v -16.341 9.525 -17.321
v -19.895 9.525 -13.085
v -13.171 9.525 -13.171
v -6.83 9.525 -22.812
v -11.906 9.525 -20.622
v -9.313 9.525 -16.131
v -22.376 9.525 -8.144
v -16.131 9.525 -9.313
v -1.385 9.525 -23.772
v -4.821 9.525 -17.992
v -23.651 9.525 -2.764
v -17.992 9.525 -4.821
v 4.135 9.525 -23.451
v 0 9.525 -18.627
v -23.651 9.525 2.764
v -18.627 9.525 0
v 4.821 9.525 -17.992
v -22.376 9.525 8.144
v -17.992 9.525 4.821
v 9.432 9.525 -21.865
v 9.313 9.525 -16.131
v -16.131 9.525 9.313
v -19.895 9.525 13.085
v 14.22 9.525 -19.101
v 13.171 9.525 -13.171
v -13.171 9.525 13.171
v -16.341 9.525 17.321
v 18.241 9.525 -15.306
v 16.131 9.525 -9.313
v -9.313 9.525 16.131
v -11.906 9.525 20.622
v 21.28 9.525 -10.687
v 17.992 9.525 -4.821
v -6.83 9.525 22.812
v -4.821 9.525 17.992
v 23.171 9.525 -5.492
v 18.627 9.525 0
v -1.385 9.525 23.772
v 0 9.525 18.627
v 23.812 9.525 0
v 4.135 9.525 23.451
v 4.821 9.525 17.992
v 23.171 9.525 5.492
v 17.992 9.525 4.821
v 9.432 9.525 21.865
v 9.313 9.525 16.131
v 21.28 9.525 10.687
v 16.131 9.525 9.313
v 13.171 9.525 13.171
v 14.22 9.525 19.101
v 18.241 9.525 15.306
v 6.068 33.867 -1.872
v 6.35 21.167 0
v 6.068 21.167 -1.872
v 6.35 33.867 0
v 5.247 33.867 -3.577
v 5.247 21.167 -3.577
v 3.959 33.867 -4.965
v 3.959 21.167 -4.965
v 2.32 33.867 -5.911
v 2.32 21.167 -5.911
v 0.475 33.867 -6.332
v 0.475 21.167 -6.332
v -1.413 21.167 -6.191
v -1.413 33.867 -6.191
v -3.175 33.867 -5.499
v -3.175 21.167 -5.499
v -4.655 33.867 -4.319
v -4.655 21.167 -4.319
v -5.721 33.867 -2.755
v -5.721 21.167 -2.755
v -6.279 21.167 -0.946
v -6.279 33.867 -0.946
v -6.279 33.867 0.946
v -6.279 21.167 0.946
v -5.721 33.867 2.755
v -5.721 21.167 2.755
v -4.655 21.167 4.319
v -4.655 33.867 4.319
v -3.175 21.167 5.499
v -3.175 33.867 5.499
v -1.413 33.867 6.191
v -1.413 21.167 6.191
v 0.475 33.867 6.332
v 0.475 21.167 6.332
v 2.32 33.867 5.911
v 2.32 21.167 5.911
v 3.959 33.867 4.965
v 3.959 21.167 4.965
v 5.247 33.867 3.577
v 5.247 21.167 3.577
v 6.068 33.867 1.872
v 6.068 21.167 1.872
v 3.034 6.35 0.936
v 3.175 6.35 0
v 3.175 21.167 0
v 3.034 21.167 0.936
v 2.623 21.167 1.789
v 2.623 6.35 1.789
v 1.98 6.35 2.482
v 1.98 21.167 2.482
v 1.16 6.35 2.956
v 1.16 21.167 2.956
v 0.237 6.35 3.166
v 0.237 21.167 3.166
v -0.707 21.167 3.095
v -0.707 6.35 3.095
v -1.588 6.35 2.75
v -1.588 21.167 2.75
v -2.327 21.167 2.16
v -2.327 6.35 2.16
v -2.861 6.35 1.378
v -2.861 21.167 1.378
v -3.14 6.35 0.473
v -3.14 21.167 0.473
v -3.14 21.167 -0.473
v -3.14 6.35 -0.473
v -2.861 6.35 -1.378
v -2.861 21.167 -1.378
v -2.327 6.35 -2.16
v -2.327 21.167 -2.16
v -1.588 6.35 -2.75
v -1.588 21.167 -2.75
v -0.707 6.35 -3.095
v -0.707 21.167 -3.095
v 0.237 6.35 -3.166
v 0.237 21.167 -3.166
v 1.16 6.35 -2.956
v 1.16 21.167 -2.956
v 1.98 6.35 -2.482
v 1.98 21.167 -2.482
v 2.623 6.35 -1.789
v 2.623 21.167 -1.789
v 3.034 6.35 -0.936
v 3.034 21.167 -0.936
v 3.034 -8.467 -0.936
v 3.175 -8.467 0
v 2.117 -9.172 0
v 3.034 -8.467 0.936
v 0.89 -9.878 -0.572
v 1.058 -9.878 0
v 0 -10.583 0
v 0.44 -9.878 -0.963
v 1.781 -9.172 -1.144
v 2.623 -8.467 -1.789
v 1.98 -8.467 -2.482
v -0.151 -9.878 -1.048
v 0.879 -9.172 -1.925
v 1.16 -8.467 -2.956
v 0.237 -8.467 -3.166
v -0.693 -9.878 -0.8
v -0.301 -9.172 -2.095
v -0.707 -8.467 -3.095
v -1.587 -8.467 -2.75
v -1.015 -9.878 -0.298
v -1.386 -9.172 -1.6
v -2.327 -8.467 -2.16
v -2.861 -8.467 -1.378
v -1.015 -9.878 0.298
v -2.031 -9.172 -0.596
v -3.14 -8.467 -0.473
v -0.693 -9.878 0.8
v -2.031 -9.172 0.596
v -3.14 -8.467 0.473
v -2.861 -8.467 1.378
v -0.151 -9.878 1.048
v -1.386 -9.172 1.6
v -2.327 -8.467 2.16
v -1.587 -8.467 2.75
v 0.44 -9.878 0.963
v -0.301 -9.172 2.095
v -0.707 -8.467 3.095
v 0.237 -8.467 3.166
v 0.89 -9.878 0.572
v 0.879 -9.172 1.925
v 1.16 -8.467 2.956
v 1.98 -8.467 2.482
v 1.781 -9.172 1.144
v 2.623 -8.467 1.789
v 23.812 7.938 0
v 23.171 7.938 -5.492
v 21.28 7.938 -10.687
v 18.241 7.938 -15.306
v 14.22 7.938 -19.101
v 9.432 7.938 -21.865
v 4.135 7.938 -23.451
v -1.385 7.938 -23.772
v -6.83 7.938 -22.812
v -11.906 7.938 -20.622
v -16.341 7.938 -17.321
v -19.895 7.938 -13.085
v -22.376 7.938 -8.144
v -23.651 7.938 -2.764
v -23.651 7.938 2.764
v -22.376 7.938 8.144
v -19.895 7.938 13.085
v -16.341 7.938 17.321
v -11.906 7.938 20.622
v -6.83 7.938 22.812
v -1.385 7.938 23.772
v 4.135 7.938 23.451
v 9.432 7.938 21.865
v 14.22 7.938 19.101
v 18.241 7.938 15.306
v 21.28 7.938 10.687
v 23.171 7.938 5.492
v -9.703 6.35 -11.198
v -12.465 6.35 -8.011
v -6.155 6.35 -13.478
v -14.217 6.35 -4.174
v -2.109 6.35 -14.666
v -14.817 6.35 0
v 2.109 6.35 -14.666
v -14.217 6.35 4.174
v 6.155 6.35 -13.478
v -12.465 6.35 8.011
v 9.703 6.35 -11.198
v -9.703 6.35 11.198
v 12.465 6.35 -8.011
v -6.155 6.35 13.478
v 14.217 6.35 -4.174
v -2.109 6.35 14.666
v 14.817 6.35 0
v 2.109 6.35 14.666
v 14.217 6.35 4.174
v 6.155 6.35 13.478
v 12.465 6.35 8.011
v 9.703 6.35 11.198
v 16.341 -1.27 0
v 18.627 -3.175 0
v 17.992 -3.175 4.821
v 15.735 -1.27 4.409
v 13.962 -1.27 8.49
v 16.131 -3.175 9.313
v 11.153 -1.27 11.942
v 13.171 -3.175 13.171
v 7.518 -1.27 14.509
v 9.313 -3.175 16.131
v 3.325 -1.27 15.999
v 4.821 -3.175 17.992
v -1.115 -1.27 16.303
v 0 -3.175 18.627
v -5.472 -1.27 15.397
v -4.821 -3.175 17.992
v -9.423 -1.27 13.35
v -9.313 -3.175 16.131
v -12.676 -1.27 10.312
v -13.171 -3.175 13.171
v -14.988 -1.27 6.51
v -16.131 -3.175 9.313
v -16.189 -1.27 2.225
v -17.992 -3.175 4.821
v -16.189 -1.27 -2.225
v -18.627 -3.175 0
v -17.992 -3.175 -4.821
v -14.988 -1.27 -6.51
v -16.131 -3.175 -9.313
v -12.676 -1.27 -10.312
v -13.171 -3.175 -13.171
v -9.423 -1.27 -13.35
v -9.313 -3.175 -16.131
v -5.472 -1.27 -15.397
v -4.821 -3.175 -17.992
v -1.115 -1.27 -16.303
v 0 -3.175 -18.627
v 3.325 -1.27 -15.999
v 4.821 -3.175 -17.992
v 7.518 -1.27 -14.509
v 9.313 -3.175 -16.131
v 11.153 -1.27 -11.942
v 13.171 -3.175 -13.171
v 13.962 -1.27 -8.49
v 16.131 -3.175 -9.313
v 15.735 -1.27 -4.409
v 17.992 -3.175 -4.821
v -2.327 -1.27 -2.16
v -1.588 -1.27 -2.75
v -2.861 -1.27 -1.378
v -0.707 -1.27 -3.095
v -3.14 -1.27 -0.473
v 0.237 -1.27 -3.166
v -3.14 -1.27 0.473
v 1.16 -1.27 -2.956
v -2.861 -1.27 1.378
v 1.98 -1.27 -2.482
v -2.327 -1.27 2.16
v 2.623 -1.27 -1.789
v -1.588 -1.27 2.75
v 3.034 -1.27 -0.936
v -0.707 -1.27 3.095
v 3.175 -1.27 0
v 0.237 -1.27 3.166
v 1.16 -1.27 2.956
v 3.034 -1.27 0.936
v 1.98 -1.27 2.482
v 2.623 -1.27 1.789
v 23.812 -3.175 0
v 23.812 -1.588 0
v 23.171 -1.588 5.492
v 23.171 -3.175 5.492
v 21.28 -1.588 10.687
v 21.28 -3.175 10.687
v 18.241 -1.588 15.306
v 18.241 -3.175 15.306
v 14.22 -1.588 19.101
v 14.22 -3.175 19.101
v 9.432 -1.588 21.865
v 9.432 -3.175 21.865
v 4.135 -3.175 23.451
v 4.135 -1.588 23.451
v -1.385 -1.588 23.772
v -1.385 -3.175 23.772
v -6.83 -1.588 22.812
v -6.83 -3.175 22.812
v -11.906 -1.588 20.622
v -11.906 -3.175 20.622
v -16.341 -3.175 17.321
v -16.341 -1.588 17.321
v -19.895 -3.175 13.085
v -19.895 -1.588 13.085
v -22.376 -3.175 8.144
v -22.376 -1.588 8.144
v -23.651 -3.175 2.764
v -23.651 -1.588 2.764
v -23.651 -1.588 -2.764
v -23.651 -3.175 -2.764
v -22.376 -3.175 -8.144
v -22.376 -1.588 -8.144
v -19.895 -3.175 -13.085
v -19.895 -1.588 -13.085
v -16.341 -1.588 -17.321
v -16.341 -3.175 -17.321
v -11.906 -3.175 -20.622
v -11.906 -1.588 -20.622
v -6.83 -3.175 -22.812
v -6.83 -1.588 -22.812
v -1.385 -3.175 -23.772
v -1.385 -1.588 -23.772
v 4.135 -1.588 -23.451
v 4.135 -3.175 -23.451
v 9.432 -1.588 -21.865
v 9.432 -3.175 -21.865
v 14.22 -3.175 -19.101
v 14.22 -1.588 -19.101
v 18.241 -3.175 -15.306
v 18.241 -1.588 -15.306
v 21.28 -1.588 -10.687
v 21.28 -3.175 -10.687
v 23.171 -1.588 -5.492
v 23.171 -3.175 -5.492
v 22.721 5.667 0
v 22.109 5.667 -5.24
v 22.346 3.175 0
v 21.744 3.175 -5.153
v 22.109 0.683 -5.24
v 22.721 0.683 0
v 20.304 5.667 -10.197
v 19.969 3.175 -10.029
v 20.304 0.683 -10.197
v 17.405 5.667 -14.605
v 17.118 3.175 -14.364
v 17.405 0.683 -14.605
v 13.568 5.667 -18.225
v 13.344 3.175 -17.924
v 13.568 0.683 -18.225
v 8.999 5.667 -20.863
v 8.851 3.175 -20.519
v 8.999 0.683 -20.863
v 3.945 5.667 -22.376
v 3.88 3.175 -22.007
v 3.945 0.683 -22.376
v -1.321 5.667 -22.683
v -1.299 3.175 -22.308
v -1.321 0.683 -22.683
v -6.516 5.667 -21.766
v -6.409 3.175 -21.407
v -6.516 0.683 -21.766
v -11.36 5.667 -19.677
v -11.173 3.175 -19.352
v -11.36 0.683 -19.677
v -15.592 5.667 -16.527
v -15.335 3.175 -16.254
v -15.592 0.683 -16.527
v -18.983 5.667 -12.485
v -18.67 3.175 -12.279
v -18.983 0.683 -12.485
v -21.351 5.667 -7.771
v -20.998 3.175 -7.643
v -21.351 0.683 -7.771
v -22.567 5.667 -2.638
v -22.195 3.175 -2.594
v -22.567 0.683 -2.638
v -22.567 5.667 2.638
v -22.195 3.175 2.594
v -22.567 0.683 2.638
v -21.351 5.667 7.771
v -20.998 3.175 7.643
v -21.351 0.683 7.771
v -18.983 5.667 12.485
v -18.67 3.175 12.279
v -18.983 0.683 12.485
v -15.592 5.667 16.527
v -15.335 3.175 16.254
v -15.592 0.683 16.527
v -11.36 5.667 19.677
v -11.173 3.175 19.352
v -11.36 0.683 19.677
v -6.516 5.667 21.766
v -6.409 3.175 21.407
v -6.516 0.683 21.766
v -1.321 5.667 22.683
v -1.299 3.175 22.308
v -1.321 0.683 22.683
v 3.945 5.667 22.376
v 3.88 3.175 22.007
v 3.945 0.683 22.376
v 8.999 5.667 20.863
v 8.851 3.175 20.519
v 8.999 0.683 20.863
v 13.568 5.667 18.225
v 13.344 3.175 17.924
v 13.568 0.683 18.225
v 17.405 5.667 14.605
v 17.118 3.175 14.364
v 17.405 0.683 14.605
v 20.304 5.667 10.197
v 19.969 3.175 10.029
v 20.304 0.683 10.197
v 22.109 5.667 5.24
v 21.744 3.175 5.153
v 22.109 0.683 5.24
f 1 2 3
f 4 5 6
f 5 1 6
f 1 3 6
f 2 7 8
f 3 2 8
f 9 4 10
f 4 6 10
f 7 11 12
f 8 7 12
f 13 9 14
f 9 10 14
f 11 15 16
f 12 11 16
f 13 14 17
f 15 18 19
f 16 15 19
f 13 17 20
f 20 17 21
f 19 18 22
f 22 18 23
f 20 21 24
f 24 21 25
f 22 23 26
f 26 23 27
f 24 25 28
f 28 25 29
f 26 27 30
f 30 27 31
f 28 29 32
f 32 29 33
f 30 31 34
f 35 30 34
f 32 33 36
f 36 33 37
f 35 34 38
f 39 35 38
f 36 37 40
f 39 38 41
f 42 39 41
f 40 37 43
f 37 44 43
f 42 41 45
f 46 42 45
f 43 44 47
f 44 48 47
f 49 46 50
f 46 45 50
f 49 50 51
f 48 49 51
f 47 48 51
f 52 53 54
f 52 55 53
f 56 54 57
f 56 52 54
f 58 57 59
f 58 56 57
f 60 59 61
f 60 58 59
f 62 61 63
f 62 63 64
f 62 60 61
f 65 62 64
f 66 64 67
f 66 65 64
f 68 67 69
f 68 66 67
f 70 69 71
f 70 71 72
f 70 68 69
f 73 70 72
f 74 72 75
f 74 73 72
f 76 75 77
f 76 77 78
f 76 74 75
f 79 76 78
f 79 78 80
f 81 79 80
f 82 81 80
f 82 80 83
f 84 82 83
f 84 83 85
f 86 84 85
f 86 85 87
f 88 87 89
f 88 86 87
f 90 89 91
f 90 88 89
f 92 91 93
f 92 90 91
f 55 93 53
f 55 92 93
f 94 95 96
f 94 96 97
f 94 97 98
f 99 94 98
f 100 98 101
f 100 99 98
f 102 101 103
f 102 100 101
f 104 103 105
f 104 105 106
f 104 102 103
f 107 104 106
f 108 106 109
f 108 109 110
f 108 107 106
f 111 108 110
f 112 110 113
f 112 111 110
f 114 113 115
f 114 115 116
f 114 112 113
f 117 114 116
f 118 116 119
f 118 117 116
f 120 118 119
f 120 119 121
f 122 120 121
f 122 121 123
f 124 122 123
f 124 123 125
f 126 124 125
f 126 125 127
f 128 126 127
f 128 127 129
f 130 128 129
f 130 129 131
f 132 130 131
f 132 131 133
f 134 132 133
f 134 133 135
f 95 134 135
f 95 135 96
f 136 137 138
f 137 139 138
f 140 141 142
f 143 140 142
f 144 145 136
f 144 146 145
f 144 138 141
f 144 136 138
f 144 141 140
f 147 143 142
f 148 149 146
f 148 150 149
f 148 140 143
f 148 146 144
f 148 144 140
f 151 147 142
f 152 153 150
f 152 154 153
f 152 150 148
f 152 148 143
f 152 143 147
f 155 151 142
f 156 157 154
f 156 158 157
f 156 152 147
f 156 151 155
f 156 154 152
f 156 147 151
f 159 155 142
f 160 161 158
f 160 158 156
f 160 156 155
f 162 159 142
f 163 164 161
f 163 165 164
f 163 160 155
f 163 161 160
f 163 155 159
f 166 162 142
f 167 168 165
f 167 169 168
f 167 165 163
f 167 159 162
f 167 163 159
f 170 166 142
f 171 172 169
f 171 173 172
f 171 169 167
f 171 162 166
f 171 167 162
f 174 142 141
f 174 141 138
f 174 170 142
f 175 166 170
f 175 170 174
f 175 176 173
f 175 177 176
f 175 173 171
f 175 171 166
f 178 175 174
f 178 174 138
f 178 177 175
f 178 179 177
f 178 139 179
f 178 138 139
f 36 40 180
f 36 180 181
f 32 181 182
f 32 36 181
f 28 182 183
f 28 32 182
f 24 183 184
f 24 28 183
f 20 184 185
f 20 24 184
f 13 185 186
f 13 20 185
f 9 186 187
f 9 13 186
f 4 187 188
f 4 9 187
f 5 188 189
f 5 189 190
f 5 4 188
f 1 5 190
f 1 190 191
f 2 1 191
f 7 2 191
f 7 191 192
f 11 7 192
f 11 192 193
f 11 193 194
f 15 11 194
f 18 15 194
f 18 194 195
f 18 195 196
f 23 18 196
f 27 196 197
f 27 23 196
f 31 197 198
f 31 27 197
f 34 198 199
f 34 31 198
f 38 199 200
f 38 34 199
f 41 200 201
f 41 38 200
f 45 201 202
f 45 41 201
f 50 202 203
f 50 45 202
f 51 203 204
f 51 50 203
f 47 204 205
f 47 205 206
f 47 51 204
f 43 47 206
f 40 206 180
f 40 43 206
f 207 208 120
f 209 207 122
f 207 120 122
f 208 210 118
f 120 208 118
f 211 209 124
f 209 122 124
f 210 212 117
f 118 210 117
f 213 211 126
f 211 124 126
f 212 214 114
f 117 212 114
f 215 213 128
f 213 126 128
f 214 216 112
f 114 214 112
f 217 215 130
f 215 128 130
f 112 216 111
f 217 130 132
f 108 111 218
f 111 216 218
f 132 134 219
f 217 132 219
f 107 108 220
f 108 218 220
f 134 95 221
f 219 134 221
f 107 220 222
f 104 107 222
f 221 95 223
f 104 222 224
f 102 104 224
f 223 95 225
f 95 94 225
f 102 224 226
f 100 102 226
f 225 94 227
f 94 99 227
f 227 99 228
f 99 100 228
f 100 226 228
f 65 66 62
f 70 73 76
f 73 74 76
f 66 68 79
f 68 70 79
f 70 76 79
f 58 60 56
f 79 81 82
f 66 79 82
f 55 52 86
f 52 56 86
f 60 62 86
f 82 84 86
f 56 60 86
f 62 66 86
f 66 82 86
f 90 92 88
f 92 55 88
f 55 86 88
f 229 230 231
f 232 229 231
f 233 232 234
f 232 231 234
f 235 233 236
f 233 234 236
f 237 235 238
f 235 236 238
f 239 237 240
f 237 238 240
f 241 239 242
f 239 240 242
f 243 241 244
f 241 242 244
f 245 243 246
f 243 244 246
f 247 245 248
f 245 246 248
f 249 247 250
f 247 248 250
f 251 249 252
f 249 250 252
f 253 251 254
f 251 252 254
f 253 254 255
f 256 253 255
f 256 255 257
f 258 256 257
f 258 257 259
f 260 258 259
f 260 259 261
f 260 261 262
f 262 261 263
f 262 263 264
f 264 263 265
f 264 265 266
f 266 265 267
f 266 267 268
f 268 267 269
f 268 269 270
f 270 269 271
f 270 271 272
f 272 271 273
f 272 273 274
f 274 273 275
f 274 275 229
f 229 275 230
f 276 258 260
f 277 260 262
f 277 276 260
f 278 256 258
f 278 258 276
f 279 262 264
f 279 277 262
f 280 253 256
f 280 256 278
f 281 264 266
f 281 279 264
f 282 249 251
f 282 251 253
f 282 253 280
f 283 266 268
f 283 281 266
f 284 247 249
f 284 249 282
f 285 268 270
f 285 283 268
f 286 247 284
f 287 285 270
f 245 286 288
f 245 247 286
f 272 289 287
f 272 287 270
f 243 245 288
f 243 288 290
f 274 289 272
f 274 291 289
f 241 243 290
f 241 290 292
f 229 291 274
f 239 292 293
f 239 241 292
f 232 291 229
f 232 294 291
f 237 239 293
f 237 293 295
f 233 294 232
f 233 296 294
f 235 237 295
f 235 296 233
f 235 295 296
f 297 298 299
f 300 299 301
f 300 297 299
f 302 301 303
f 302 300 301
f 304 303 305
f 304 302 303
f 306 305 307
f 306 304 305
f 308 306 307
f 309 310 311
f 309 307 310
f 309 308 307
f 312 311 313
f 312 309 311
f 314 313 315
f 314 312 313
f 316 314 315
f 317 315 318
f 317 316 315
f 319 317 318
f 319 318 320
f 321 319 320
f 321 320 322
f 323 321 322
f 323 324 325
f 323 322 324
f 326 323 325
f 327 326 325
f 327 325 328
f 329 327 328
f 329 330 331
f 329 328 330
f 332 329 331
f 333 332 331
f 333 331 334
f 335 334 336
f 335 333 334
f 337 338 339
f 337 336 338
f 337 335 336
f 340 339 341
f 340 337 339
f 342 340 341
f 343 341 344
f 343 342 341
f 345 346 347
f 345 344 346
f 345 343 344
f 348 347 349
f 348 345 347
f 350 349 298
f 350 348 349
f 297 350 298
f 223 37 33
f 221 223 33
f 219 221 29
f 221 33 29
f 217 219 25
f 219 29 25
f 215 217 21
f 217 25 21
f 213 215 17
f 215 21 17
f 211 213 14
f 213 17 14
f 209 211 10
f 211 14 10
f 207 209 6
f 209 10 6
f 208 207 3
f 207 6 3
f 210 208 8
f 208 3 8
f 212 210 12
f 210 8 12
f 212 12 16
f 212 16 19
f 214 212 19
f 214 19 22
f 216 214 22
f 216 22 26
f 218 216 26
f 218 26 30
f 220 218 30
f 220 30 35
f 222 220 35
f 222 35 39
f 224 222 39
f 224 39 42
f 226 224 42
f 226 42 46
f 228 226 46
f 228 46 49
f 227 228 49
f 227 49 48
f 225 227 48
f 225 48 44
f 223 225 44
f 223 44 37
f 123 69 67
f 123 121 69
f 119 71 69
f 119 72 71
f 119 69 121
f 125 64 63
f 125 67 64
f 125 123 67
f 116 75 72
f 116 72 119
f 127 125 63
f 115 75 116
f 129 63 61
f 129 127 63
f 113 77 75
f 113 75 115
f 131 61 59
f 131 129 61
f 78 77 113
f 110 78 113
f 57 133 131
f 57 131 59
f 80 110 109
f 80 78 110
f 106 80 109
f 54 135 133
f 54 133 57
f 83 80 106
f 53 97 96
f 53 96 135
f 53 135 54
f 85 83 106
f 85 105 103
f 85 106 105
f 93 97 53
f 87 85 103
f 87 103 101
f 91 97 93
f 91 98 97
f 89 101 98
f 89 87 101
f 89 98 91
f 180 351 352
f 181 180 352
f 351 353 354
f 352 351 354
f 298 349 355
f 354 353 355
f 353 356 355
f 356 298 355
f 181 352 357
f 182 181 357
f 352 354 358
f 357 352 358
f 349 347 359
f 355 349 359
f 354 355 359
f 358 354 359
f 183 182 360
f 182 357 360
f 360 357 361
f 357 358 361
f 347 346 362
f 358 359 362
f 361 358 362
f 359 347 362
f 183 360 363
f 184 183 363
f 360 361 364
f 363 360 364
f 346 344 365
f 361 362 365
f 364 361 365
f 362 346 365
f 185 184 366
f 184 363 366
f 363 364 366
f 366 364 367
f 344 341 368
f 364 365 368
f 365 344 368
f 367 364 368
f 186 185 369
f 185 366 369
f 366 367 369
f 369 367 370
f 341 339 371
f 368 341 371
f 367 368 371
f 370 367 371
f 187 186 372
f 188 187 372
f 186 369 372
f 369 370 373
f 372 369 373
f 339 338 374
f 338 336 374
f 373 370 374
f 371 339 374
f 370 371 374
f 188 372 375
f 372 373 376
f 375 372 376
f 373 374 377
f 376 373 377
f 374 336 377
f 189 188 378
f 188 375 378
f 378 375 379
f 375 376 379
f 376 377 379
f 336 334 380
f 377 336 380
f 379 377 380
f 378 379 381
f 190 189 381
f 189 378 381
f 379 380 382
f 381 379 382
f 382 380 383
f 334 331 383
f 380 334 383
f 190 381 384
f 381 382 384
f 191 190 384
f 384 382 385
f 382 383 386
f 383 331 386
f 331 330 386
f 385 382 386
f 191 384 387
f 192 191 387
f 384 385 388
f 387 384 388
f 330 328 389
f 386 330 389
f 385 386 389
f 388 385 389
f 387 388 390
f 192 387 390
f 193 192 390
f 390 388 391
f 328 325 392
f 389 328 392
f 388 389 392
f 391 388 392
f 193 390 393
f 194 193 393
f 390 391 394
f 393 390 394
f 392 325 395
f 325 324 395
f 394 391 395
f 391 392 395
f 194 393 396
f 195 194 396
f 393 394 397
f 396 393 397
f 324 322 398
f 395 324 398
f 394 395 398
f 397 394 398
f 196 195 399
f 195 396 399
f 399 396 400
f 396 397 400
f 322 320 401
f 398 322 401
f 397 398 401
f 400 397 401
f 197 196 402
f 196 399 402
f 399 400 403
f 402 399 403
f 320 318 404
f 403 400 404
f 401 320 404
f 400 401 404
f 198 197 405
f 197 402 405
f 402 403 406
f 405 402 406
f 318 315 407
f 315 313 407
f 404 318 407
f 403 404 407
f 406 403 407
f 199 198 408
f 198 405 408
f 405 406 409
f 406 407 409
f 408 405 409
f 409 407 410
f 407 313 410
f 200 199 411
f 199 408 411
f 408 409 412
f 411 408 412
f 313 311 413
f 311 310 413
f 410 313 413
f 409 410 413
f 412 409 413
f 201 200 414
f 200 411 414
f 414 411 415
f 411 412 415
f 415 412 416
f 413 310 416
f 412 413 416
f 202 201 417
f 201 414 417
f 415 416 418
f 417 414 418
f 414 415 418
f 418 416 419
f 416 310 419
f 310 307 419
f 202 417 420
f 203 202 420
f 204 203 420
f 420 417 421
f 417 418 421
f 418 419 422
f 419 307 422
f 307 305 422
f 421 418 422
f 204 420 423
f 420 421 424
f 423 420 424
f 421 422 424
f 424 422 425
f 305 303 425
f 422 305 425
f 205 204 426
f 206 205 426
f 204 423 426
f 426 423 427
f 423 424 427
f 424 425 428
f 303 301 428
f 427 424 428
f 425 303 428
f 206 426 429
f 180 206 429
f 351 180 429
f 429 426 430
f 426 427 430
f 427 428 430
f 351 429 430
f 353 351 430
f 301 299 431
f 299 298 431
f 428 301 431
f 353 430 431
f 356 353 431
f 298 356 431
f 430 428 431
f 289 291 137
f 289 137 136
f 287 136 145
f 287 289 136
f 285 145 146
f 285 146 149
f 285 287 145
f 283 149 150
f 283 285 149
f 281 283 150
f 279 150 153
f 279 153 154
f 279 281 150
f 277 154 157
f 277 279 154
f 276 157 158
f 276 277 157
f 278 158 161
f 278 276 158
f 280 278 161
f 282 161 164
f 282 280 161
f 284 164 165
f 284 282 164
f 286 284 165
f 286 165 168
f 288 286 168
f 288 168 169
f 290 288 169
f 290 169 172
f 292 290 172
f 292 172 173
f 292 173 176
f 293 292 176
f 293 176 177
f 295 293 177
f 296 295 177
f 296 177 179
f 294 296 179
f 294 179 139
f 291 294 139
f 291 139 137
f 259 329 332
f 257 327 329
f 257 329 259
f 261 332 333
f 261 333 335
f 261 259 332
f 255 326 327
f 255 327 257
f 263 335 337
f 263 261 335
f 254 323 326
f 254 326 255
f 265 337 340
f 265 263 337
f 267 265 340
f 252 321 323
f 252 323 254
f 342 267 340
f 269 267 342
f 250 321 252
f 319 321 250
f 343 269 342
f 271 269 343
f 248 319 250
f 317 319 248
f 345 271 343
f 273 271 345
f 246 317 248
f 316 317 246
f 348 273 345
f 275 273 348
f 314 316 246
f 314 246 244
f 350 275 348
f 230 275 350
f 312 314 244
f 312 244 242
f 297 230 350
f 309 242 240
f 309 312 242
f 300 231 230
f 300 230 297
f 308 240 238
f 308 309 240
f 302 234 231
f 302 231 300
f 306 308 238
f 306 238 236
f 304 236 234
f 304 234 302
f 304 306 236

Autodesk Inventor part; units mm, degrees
ref_plane "YZ Plane" through (0, 0, 0) normal (1, 0, 0) x (0, 1, 0)
ref_plane "XZ Plane" through (0, 0, 0) normal (0, 1, 0) x (-1, 0, 0)
ref_plane "XY Plane" through (0, 0, 0) normal (0, 0, 1) x (1, 0, 0)
sketch "Sketch1" plane through (0, 0, 0) normal (0, 0, 1) x (1, 0, 0)
  line L0 (0, 0) -> (0, 21.1667)
  line L1 (0, 0) -> (0, -10.5833)
  line L2 (0, 21.1667) -> (0, 33.8667)
  line L3 (6.35, 21.1667) -> (6.35, 33.8667)
  line L4 (6.35, 33.8667) -> (0, 33.8667)
  line L5 (3.175, 12.7991) -> (0, 12.7991) construction
  line L6 (6.35, 21.1667) -> (3.175, 21.1667)
  line L7 (3.175, 21.1667) -> (0, 21.1667) construction
  line L8 (0, 0) -> (3.175, 0) construction
  line L9 (3.175, 0) -> (17.91, 0) construction
  line L10 (23.8125, 7.9375) -> (23.8125, 9.525)
  line L11 (14.8167, 6.35) -> (3.175, 6.35)
  line L12 (18.6267, 9.525) -> (23.8125, 9.525)
  line L13 (0, -10.5833) -> (3.175, -8.4667)
  line L14 (3.175, -8.4667) -> (3.175, 0)
  line L15 (14.8167, 6.35) -> (18.6267, 9.525)
  line L16 (3.175, 21.1667) -> (3.175, 6.35)
  line L17 (1.0583, 6.35) -> (3.175, 6.35) construction
  line L18 (1.0583, 6.35) -> (1.0583, 3.175) construction
  line L19 (1.0583, 3.175) -> (5.214, 3.175) construction
  line L20 (23.8125, -1.5875) -> (23.8125, -3.175)
  line L21 (14.8167, 0) -> (3.175, 0)
  line L22 (18.6267, -3.175) -> (23.8125, -3.175)
  line L23 (14.8167, 0) -> (18.6267, -3.175)
  line L24 (3.175, 0) -> (3.175, 0)
  arc A0 (23.8125, 7.9375) -> (23.8125, -1.5875) centre (30.8127, 3.175) ccw
  line L25 (23.8125, -3.175) -> (23.495, -3.175)
  dimension "d5" = 44.45
  dimension "d6" = 12.7
  dimension "d7" = 6.35
  dimension "d12" = 2.1167
  dimension "d13" = 3.175
  dimension "d15" = 8.4667
  dimension "d18" = 1.5875
  dimension "d20" = 3.175
  dimension "d21" = 3.81
  dimension "d26" = 23.8125
  dimension "d30" = 11.6417
  dimension "d31" = 3.175
  dimension "d32" = 2.1167
  dimension "d33" = 8.4667
  dimension "d34" = 3.175
  dimension "d36" = 0.3175
revolve "Revolution1" add sketch "Sketch1" angle 360 about axis through (0, 21.1667, 0) along (0, -1, 0)
move faces "Move1" translate (0, -1.27, 0) faces at (10.7618, 0, -1.4352)
properties part number "Top Spoolish"
